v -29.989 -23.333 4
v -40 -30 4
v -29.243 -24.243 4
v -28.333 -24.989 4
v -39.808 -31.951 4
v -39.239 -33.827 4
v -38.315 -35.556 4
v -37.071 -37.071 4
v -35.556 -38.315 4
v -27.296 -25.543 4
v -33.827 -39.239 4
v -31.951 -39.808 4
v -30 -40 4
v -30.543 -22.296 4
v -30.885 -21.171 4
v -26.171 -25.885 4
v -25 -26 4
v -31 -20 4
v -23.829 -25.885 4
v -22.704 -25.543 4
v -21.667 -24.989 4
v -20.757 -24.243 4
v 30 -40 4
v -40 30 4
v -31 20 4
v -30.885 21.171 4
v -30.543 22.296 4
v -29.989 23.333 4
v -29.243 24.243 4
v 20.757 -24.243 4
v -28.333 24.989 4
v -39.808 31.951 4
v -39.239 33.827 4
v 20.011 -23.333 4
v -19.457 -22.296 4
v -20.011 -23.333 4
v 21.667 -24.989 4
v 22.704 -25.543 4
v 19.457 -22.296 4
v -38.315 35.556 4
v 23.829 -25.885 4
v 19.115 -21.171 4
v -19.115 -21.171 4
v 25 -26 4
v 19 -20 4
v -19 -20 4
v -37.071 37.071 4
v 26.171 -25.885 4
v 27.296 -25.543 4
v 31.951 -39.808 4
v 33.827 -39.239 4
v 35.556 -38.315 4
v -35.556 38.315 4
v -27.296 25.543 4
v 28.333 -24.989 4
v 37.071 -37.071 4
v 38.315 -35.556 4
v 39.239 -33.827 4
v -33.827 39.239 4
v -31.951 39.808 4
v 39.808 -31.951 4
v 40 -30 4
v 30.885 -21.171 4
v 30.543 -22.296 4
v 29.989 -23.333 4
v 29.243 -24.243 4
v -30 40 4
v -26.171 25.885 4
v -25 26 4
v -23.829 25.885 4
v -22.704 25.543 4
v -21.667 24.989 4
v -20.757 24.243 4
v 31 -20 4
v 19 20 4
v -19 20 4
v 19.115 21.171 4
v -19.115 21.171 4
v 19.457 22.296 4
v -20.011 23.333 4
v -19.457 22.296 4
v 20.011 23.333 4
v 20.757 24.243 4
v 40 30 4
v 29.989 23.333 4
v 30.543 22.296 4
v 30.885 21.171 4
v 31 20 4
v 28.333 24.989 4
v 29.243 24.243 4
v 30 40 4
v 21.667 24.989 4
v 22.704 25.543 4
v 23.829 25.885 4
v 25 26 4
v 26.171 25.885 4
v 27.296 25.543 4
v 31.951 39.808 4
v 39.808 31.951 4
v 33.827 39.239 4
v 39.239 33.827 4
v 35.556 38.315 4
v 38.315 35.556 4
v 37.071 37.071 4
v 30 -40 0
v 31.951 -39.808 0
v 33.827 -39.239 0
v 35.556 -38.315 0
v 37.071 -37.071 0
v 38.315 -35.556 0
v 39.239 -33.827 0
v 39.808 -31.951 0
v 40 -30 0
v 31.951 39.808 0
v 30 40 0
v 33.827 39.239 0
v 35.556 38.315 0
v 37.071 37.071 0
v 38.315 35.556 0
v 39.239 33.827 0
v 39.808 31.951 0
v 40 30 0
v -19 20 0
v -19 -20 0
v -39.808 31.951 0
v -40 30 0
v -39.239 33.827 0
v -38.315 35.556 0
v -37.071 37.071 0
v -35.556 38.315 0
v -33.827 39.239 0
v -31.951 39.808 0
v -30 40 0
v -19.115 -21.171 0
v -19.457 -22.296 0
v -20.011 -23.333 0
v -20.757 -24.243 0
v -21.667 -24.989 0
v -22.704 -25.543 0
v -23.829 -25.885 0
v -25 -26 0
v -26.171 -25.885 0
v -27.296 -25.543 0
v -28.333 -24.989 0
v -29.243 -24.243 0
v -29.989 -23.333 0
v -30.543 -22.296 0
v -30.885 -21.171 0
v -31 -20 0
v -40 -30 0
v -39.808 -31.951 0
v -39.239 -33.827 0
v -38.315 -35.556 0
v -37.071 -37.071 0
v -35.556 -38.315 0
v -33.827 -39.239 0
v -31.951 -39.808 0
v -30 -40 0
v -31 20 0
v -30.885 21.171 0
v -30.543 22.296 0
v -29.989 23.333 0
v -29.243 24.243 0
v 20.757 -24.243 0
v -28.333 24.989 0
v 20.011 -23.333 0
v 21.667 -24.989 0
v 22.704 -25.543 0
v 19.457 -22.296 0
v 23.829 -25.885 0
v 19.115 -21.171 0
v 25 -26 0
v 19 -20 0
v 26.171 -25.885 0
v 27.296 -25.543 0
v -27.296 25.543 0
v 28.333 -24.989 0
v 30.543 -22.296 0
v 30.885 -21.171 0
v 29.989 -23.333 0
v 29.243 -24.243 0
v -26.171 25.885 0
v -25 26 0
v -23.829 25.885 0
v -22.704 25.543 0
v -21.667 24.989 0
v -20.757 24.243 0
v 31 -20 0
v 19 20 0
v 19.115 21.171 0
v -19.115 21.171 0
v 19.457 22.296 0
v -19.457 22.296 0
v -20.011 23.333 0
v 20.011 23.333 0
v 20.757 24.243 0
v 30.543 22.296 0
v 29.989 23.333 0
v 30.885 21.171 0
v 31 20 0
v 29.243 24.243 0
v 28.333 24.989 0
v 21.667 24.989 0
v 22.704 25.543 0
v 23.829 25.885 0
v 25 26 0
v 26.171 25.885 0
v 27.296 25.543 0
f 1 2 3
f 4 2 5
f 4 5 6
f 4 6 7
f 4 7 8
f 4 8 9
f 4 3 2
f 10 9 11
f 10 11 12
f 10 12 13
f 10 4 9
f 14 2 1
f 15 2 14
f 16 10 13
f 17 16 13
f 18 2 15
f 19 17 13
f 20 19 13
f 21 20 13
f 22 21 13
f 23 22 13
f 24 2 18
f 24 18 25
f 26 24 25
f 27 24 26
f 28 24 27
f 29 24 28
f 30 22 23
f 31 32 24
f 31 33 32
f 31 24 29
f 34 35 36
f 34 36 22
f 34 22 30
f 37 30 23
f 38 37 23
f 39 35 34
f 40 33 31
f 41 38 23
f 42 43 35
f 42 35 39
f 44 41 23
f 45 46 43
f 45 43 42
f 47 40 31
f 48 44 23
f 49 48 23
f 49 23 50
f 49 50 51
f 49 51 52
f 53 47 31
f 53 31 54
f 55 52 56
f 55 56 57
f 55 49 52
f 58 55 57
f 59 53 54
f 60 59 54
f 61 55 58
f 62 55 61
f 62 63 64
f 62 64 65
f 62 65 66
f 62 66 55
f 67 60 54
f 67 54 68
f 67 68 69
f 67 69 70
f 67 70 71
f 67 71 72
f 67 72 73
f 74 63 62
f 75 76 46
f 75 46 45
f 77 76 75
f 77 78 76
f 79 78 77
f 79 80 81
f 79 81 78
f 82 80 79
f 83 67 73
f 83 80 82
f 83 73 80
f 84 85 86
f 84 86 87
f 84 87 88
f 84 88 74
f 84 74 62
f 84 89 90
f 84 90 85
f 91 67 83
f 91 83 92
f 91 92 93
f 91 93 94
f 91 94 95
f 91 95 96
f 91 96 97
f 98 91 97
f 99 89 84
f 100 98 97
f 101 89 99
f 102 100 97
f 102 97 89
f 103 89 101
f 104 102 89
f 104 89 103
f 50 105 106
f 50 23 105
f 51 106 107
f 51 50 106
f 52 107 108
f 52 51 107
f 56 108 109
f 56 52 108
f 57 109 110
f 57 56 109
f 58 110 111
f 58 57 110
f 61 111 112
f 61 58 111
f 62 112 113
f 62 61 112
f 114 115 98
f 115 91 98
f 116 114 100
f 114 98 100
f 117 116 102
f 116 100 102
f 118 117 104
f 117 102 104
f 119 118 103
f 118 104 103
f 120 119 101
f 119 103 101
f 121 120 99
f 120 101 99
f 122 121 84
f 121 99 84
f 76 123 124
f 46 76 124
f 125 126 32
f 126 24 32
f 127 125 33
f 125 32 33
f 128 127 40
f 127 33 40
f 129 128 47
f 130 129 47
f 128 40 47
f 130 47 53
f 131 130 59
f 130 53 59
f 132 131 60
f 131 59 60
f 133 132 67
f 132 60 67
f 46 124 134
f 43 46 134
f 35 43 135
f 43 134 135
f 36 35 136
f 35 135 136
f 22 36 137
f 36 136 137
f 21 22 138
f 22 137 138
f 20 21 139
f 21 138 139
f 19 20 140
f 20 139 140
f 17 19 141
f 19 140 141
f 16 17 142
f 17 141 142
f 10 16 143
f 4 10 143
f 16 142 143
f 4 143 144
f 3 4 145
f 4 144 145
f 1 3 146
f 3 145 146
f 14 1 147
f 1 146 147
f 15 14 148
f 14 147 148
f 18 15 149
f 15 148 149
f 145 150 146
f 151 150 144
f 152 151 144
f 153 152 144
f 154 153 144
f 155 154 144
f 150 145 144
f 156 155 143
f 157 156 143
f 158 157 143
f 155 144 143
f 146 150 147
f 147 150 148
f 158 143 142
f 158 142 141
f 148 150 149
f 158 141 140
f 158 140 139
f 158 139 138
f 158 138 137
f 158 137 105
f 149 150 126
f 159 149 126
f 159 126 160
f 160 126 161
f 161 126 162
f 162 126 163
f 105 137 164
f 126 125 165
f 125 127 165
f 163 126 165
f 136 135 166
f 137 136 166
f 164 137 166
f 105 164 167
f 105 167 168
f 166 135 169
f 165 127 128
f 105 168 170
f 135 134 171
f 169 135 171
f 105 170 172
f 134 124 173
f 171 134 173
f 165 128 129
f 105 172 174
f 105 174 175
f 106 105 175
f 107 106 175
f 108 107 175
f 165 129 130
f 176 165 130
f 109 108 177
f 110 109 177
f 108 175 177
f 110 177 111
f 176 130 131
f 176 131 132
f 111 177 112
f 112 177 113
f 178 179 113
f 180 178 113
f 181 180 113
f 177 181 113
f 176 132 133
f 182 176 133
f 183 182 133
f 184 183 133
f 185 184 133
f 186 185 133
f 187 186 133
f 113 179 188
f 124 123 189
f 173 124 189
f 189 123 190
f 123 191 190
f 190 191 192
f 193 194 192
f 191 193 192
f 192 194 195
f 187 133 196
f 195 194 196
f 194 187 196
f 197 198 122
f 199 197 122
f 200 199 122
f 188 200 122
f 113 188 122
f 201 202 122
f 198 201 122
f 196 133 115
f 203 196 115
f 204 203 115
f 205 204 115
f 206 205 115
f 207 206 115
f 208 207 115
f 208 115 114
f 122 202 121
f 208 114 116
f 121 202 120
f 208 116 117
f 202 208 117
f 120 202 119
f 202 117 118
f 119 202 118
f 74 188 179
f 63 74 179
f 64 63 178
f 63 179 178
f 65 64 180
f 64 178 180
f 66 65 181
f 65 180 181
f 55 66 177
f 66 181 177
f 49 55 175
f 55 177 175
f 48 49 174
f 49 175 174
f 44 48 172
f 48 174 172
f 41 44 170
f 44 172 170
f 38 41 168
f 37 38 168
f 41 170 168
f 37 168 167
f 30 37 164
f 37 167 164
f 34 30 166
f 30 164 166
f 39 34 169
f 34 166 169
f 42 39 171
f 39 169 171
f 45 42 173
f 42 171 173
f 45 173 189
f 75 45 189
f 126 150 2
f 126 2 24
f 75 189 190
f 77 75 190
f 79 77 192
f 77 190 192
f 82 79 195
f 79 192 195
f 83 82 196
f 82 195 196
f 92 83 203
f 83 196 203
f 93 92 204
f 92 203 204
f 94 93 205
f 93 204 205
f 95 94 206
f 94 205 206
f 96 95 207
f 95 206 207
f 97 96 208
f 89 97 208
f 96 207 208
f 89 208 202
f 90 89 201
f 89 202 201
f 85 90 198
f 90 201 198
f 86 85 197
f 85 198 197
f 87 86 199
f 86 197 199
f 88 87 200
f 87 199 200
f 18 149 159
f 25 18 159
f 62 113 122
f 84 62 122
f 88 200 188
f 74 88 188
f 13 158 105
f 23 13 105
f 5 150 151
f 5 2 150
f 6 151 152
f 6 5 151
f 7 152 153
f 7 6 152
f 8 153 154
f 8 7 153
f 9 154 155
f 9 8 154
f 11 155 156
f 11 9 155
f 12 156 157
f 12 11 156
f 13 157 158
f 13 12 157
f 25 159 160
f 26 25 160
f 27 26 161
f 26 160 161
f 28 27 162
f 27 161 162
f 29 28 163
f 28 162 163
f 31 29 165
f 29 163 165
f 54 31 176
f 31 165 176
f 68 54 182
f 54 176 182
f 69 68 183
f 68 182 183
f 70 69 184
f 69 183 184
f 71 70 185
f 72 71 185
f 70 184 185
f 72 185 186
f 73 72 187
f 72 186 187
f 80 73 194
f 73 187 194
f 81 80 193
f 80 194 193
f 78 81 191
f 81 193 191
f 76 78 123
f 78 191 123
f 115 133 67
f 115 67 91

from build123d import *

# Parameters (mm, degrees)
SKETCH_1_W      = 80
SKETCH_1_H      = 80
EXTRUDE_1_DEPTH = 4
FILLET_1_R      = 10


with BuildPart() as part:
    # Эскиз1 → Бобышка-Вытянуть1 (new body)
    with BuildSketch(Plane.XY):
        Rectangle(SKETCH_1_W, SKETCH_1_H)
        with BuildLine():
            Line((19, -20), (19, 20))
            ThreePointArc((19, 20), (25, 26), (31, 20))
            Line((31, 20), (31, -20))
            ThreePointArc((31, -20), (25, -26), (19, -20))
        make_face(mode=Mode.SUBTRACT)
        with BuildLine():
            Line((-31, -20), (-31, 20))
            ThreePointArc((-31, 20), (-25, 26), (-19, 20))
            Line((-19, 20), (-19, -20))
            ThreePointArc((-19, -20), (-25, -26), (-31, -20))
        make_face(mode=Mode.SUBTRACT)
    extrude(amount=EXTRUDE_1_DEPTH)

    # Скругление1
    fillet_1_edges = [part.edges().sort_by_distance(p)[0] for p in [
        (40, -40, 2),
        (-40, -40, 2),
        (-40, 40, 2),
        (40, 40, 2),
    ]]
    fillet(fillet_1_edges, radius=FILLET_1_R)


solid = part.part
